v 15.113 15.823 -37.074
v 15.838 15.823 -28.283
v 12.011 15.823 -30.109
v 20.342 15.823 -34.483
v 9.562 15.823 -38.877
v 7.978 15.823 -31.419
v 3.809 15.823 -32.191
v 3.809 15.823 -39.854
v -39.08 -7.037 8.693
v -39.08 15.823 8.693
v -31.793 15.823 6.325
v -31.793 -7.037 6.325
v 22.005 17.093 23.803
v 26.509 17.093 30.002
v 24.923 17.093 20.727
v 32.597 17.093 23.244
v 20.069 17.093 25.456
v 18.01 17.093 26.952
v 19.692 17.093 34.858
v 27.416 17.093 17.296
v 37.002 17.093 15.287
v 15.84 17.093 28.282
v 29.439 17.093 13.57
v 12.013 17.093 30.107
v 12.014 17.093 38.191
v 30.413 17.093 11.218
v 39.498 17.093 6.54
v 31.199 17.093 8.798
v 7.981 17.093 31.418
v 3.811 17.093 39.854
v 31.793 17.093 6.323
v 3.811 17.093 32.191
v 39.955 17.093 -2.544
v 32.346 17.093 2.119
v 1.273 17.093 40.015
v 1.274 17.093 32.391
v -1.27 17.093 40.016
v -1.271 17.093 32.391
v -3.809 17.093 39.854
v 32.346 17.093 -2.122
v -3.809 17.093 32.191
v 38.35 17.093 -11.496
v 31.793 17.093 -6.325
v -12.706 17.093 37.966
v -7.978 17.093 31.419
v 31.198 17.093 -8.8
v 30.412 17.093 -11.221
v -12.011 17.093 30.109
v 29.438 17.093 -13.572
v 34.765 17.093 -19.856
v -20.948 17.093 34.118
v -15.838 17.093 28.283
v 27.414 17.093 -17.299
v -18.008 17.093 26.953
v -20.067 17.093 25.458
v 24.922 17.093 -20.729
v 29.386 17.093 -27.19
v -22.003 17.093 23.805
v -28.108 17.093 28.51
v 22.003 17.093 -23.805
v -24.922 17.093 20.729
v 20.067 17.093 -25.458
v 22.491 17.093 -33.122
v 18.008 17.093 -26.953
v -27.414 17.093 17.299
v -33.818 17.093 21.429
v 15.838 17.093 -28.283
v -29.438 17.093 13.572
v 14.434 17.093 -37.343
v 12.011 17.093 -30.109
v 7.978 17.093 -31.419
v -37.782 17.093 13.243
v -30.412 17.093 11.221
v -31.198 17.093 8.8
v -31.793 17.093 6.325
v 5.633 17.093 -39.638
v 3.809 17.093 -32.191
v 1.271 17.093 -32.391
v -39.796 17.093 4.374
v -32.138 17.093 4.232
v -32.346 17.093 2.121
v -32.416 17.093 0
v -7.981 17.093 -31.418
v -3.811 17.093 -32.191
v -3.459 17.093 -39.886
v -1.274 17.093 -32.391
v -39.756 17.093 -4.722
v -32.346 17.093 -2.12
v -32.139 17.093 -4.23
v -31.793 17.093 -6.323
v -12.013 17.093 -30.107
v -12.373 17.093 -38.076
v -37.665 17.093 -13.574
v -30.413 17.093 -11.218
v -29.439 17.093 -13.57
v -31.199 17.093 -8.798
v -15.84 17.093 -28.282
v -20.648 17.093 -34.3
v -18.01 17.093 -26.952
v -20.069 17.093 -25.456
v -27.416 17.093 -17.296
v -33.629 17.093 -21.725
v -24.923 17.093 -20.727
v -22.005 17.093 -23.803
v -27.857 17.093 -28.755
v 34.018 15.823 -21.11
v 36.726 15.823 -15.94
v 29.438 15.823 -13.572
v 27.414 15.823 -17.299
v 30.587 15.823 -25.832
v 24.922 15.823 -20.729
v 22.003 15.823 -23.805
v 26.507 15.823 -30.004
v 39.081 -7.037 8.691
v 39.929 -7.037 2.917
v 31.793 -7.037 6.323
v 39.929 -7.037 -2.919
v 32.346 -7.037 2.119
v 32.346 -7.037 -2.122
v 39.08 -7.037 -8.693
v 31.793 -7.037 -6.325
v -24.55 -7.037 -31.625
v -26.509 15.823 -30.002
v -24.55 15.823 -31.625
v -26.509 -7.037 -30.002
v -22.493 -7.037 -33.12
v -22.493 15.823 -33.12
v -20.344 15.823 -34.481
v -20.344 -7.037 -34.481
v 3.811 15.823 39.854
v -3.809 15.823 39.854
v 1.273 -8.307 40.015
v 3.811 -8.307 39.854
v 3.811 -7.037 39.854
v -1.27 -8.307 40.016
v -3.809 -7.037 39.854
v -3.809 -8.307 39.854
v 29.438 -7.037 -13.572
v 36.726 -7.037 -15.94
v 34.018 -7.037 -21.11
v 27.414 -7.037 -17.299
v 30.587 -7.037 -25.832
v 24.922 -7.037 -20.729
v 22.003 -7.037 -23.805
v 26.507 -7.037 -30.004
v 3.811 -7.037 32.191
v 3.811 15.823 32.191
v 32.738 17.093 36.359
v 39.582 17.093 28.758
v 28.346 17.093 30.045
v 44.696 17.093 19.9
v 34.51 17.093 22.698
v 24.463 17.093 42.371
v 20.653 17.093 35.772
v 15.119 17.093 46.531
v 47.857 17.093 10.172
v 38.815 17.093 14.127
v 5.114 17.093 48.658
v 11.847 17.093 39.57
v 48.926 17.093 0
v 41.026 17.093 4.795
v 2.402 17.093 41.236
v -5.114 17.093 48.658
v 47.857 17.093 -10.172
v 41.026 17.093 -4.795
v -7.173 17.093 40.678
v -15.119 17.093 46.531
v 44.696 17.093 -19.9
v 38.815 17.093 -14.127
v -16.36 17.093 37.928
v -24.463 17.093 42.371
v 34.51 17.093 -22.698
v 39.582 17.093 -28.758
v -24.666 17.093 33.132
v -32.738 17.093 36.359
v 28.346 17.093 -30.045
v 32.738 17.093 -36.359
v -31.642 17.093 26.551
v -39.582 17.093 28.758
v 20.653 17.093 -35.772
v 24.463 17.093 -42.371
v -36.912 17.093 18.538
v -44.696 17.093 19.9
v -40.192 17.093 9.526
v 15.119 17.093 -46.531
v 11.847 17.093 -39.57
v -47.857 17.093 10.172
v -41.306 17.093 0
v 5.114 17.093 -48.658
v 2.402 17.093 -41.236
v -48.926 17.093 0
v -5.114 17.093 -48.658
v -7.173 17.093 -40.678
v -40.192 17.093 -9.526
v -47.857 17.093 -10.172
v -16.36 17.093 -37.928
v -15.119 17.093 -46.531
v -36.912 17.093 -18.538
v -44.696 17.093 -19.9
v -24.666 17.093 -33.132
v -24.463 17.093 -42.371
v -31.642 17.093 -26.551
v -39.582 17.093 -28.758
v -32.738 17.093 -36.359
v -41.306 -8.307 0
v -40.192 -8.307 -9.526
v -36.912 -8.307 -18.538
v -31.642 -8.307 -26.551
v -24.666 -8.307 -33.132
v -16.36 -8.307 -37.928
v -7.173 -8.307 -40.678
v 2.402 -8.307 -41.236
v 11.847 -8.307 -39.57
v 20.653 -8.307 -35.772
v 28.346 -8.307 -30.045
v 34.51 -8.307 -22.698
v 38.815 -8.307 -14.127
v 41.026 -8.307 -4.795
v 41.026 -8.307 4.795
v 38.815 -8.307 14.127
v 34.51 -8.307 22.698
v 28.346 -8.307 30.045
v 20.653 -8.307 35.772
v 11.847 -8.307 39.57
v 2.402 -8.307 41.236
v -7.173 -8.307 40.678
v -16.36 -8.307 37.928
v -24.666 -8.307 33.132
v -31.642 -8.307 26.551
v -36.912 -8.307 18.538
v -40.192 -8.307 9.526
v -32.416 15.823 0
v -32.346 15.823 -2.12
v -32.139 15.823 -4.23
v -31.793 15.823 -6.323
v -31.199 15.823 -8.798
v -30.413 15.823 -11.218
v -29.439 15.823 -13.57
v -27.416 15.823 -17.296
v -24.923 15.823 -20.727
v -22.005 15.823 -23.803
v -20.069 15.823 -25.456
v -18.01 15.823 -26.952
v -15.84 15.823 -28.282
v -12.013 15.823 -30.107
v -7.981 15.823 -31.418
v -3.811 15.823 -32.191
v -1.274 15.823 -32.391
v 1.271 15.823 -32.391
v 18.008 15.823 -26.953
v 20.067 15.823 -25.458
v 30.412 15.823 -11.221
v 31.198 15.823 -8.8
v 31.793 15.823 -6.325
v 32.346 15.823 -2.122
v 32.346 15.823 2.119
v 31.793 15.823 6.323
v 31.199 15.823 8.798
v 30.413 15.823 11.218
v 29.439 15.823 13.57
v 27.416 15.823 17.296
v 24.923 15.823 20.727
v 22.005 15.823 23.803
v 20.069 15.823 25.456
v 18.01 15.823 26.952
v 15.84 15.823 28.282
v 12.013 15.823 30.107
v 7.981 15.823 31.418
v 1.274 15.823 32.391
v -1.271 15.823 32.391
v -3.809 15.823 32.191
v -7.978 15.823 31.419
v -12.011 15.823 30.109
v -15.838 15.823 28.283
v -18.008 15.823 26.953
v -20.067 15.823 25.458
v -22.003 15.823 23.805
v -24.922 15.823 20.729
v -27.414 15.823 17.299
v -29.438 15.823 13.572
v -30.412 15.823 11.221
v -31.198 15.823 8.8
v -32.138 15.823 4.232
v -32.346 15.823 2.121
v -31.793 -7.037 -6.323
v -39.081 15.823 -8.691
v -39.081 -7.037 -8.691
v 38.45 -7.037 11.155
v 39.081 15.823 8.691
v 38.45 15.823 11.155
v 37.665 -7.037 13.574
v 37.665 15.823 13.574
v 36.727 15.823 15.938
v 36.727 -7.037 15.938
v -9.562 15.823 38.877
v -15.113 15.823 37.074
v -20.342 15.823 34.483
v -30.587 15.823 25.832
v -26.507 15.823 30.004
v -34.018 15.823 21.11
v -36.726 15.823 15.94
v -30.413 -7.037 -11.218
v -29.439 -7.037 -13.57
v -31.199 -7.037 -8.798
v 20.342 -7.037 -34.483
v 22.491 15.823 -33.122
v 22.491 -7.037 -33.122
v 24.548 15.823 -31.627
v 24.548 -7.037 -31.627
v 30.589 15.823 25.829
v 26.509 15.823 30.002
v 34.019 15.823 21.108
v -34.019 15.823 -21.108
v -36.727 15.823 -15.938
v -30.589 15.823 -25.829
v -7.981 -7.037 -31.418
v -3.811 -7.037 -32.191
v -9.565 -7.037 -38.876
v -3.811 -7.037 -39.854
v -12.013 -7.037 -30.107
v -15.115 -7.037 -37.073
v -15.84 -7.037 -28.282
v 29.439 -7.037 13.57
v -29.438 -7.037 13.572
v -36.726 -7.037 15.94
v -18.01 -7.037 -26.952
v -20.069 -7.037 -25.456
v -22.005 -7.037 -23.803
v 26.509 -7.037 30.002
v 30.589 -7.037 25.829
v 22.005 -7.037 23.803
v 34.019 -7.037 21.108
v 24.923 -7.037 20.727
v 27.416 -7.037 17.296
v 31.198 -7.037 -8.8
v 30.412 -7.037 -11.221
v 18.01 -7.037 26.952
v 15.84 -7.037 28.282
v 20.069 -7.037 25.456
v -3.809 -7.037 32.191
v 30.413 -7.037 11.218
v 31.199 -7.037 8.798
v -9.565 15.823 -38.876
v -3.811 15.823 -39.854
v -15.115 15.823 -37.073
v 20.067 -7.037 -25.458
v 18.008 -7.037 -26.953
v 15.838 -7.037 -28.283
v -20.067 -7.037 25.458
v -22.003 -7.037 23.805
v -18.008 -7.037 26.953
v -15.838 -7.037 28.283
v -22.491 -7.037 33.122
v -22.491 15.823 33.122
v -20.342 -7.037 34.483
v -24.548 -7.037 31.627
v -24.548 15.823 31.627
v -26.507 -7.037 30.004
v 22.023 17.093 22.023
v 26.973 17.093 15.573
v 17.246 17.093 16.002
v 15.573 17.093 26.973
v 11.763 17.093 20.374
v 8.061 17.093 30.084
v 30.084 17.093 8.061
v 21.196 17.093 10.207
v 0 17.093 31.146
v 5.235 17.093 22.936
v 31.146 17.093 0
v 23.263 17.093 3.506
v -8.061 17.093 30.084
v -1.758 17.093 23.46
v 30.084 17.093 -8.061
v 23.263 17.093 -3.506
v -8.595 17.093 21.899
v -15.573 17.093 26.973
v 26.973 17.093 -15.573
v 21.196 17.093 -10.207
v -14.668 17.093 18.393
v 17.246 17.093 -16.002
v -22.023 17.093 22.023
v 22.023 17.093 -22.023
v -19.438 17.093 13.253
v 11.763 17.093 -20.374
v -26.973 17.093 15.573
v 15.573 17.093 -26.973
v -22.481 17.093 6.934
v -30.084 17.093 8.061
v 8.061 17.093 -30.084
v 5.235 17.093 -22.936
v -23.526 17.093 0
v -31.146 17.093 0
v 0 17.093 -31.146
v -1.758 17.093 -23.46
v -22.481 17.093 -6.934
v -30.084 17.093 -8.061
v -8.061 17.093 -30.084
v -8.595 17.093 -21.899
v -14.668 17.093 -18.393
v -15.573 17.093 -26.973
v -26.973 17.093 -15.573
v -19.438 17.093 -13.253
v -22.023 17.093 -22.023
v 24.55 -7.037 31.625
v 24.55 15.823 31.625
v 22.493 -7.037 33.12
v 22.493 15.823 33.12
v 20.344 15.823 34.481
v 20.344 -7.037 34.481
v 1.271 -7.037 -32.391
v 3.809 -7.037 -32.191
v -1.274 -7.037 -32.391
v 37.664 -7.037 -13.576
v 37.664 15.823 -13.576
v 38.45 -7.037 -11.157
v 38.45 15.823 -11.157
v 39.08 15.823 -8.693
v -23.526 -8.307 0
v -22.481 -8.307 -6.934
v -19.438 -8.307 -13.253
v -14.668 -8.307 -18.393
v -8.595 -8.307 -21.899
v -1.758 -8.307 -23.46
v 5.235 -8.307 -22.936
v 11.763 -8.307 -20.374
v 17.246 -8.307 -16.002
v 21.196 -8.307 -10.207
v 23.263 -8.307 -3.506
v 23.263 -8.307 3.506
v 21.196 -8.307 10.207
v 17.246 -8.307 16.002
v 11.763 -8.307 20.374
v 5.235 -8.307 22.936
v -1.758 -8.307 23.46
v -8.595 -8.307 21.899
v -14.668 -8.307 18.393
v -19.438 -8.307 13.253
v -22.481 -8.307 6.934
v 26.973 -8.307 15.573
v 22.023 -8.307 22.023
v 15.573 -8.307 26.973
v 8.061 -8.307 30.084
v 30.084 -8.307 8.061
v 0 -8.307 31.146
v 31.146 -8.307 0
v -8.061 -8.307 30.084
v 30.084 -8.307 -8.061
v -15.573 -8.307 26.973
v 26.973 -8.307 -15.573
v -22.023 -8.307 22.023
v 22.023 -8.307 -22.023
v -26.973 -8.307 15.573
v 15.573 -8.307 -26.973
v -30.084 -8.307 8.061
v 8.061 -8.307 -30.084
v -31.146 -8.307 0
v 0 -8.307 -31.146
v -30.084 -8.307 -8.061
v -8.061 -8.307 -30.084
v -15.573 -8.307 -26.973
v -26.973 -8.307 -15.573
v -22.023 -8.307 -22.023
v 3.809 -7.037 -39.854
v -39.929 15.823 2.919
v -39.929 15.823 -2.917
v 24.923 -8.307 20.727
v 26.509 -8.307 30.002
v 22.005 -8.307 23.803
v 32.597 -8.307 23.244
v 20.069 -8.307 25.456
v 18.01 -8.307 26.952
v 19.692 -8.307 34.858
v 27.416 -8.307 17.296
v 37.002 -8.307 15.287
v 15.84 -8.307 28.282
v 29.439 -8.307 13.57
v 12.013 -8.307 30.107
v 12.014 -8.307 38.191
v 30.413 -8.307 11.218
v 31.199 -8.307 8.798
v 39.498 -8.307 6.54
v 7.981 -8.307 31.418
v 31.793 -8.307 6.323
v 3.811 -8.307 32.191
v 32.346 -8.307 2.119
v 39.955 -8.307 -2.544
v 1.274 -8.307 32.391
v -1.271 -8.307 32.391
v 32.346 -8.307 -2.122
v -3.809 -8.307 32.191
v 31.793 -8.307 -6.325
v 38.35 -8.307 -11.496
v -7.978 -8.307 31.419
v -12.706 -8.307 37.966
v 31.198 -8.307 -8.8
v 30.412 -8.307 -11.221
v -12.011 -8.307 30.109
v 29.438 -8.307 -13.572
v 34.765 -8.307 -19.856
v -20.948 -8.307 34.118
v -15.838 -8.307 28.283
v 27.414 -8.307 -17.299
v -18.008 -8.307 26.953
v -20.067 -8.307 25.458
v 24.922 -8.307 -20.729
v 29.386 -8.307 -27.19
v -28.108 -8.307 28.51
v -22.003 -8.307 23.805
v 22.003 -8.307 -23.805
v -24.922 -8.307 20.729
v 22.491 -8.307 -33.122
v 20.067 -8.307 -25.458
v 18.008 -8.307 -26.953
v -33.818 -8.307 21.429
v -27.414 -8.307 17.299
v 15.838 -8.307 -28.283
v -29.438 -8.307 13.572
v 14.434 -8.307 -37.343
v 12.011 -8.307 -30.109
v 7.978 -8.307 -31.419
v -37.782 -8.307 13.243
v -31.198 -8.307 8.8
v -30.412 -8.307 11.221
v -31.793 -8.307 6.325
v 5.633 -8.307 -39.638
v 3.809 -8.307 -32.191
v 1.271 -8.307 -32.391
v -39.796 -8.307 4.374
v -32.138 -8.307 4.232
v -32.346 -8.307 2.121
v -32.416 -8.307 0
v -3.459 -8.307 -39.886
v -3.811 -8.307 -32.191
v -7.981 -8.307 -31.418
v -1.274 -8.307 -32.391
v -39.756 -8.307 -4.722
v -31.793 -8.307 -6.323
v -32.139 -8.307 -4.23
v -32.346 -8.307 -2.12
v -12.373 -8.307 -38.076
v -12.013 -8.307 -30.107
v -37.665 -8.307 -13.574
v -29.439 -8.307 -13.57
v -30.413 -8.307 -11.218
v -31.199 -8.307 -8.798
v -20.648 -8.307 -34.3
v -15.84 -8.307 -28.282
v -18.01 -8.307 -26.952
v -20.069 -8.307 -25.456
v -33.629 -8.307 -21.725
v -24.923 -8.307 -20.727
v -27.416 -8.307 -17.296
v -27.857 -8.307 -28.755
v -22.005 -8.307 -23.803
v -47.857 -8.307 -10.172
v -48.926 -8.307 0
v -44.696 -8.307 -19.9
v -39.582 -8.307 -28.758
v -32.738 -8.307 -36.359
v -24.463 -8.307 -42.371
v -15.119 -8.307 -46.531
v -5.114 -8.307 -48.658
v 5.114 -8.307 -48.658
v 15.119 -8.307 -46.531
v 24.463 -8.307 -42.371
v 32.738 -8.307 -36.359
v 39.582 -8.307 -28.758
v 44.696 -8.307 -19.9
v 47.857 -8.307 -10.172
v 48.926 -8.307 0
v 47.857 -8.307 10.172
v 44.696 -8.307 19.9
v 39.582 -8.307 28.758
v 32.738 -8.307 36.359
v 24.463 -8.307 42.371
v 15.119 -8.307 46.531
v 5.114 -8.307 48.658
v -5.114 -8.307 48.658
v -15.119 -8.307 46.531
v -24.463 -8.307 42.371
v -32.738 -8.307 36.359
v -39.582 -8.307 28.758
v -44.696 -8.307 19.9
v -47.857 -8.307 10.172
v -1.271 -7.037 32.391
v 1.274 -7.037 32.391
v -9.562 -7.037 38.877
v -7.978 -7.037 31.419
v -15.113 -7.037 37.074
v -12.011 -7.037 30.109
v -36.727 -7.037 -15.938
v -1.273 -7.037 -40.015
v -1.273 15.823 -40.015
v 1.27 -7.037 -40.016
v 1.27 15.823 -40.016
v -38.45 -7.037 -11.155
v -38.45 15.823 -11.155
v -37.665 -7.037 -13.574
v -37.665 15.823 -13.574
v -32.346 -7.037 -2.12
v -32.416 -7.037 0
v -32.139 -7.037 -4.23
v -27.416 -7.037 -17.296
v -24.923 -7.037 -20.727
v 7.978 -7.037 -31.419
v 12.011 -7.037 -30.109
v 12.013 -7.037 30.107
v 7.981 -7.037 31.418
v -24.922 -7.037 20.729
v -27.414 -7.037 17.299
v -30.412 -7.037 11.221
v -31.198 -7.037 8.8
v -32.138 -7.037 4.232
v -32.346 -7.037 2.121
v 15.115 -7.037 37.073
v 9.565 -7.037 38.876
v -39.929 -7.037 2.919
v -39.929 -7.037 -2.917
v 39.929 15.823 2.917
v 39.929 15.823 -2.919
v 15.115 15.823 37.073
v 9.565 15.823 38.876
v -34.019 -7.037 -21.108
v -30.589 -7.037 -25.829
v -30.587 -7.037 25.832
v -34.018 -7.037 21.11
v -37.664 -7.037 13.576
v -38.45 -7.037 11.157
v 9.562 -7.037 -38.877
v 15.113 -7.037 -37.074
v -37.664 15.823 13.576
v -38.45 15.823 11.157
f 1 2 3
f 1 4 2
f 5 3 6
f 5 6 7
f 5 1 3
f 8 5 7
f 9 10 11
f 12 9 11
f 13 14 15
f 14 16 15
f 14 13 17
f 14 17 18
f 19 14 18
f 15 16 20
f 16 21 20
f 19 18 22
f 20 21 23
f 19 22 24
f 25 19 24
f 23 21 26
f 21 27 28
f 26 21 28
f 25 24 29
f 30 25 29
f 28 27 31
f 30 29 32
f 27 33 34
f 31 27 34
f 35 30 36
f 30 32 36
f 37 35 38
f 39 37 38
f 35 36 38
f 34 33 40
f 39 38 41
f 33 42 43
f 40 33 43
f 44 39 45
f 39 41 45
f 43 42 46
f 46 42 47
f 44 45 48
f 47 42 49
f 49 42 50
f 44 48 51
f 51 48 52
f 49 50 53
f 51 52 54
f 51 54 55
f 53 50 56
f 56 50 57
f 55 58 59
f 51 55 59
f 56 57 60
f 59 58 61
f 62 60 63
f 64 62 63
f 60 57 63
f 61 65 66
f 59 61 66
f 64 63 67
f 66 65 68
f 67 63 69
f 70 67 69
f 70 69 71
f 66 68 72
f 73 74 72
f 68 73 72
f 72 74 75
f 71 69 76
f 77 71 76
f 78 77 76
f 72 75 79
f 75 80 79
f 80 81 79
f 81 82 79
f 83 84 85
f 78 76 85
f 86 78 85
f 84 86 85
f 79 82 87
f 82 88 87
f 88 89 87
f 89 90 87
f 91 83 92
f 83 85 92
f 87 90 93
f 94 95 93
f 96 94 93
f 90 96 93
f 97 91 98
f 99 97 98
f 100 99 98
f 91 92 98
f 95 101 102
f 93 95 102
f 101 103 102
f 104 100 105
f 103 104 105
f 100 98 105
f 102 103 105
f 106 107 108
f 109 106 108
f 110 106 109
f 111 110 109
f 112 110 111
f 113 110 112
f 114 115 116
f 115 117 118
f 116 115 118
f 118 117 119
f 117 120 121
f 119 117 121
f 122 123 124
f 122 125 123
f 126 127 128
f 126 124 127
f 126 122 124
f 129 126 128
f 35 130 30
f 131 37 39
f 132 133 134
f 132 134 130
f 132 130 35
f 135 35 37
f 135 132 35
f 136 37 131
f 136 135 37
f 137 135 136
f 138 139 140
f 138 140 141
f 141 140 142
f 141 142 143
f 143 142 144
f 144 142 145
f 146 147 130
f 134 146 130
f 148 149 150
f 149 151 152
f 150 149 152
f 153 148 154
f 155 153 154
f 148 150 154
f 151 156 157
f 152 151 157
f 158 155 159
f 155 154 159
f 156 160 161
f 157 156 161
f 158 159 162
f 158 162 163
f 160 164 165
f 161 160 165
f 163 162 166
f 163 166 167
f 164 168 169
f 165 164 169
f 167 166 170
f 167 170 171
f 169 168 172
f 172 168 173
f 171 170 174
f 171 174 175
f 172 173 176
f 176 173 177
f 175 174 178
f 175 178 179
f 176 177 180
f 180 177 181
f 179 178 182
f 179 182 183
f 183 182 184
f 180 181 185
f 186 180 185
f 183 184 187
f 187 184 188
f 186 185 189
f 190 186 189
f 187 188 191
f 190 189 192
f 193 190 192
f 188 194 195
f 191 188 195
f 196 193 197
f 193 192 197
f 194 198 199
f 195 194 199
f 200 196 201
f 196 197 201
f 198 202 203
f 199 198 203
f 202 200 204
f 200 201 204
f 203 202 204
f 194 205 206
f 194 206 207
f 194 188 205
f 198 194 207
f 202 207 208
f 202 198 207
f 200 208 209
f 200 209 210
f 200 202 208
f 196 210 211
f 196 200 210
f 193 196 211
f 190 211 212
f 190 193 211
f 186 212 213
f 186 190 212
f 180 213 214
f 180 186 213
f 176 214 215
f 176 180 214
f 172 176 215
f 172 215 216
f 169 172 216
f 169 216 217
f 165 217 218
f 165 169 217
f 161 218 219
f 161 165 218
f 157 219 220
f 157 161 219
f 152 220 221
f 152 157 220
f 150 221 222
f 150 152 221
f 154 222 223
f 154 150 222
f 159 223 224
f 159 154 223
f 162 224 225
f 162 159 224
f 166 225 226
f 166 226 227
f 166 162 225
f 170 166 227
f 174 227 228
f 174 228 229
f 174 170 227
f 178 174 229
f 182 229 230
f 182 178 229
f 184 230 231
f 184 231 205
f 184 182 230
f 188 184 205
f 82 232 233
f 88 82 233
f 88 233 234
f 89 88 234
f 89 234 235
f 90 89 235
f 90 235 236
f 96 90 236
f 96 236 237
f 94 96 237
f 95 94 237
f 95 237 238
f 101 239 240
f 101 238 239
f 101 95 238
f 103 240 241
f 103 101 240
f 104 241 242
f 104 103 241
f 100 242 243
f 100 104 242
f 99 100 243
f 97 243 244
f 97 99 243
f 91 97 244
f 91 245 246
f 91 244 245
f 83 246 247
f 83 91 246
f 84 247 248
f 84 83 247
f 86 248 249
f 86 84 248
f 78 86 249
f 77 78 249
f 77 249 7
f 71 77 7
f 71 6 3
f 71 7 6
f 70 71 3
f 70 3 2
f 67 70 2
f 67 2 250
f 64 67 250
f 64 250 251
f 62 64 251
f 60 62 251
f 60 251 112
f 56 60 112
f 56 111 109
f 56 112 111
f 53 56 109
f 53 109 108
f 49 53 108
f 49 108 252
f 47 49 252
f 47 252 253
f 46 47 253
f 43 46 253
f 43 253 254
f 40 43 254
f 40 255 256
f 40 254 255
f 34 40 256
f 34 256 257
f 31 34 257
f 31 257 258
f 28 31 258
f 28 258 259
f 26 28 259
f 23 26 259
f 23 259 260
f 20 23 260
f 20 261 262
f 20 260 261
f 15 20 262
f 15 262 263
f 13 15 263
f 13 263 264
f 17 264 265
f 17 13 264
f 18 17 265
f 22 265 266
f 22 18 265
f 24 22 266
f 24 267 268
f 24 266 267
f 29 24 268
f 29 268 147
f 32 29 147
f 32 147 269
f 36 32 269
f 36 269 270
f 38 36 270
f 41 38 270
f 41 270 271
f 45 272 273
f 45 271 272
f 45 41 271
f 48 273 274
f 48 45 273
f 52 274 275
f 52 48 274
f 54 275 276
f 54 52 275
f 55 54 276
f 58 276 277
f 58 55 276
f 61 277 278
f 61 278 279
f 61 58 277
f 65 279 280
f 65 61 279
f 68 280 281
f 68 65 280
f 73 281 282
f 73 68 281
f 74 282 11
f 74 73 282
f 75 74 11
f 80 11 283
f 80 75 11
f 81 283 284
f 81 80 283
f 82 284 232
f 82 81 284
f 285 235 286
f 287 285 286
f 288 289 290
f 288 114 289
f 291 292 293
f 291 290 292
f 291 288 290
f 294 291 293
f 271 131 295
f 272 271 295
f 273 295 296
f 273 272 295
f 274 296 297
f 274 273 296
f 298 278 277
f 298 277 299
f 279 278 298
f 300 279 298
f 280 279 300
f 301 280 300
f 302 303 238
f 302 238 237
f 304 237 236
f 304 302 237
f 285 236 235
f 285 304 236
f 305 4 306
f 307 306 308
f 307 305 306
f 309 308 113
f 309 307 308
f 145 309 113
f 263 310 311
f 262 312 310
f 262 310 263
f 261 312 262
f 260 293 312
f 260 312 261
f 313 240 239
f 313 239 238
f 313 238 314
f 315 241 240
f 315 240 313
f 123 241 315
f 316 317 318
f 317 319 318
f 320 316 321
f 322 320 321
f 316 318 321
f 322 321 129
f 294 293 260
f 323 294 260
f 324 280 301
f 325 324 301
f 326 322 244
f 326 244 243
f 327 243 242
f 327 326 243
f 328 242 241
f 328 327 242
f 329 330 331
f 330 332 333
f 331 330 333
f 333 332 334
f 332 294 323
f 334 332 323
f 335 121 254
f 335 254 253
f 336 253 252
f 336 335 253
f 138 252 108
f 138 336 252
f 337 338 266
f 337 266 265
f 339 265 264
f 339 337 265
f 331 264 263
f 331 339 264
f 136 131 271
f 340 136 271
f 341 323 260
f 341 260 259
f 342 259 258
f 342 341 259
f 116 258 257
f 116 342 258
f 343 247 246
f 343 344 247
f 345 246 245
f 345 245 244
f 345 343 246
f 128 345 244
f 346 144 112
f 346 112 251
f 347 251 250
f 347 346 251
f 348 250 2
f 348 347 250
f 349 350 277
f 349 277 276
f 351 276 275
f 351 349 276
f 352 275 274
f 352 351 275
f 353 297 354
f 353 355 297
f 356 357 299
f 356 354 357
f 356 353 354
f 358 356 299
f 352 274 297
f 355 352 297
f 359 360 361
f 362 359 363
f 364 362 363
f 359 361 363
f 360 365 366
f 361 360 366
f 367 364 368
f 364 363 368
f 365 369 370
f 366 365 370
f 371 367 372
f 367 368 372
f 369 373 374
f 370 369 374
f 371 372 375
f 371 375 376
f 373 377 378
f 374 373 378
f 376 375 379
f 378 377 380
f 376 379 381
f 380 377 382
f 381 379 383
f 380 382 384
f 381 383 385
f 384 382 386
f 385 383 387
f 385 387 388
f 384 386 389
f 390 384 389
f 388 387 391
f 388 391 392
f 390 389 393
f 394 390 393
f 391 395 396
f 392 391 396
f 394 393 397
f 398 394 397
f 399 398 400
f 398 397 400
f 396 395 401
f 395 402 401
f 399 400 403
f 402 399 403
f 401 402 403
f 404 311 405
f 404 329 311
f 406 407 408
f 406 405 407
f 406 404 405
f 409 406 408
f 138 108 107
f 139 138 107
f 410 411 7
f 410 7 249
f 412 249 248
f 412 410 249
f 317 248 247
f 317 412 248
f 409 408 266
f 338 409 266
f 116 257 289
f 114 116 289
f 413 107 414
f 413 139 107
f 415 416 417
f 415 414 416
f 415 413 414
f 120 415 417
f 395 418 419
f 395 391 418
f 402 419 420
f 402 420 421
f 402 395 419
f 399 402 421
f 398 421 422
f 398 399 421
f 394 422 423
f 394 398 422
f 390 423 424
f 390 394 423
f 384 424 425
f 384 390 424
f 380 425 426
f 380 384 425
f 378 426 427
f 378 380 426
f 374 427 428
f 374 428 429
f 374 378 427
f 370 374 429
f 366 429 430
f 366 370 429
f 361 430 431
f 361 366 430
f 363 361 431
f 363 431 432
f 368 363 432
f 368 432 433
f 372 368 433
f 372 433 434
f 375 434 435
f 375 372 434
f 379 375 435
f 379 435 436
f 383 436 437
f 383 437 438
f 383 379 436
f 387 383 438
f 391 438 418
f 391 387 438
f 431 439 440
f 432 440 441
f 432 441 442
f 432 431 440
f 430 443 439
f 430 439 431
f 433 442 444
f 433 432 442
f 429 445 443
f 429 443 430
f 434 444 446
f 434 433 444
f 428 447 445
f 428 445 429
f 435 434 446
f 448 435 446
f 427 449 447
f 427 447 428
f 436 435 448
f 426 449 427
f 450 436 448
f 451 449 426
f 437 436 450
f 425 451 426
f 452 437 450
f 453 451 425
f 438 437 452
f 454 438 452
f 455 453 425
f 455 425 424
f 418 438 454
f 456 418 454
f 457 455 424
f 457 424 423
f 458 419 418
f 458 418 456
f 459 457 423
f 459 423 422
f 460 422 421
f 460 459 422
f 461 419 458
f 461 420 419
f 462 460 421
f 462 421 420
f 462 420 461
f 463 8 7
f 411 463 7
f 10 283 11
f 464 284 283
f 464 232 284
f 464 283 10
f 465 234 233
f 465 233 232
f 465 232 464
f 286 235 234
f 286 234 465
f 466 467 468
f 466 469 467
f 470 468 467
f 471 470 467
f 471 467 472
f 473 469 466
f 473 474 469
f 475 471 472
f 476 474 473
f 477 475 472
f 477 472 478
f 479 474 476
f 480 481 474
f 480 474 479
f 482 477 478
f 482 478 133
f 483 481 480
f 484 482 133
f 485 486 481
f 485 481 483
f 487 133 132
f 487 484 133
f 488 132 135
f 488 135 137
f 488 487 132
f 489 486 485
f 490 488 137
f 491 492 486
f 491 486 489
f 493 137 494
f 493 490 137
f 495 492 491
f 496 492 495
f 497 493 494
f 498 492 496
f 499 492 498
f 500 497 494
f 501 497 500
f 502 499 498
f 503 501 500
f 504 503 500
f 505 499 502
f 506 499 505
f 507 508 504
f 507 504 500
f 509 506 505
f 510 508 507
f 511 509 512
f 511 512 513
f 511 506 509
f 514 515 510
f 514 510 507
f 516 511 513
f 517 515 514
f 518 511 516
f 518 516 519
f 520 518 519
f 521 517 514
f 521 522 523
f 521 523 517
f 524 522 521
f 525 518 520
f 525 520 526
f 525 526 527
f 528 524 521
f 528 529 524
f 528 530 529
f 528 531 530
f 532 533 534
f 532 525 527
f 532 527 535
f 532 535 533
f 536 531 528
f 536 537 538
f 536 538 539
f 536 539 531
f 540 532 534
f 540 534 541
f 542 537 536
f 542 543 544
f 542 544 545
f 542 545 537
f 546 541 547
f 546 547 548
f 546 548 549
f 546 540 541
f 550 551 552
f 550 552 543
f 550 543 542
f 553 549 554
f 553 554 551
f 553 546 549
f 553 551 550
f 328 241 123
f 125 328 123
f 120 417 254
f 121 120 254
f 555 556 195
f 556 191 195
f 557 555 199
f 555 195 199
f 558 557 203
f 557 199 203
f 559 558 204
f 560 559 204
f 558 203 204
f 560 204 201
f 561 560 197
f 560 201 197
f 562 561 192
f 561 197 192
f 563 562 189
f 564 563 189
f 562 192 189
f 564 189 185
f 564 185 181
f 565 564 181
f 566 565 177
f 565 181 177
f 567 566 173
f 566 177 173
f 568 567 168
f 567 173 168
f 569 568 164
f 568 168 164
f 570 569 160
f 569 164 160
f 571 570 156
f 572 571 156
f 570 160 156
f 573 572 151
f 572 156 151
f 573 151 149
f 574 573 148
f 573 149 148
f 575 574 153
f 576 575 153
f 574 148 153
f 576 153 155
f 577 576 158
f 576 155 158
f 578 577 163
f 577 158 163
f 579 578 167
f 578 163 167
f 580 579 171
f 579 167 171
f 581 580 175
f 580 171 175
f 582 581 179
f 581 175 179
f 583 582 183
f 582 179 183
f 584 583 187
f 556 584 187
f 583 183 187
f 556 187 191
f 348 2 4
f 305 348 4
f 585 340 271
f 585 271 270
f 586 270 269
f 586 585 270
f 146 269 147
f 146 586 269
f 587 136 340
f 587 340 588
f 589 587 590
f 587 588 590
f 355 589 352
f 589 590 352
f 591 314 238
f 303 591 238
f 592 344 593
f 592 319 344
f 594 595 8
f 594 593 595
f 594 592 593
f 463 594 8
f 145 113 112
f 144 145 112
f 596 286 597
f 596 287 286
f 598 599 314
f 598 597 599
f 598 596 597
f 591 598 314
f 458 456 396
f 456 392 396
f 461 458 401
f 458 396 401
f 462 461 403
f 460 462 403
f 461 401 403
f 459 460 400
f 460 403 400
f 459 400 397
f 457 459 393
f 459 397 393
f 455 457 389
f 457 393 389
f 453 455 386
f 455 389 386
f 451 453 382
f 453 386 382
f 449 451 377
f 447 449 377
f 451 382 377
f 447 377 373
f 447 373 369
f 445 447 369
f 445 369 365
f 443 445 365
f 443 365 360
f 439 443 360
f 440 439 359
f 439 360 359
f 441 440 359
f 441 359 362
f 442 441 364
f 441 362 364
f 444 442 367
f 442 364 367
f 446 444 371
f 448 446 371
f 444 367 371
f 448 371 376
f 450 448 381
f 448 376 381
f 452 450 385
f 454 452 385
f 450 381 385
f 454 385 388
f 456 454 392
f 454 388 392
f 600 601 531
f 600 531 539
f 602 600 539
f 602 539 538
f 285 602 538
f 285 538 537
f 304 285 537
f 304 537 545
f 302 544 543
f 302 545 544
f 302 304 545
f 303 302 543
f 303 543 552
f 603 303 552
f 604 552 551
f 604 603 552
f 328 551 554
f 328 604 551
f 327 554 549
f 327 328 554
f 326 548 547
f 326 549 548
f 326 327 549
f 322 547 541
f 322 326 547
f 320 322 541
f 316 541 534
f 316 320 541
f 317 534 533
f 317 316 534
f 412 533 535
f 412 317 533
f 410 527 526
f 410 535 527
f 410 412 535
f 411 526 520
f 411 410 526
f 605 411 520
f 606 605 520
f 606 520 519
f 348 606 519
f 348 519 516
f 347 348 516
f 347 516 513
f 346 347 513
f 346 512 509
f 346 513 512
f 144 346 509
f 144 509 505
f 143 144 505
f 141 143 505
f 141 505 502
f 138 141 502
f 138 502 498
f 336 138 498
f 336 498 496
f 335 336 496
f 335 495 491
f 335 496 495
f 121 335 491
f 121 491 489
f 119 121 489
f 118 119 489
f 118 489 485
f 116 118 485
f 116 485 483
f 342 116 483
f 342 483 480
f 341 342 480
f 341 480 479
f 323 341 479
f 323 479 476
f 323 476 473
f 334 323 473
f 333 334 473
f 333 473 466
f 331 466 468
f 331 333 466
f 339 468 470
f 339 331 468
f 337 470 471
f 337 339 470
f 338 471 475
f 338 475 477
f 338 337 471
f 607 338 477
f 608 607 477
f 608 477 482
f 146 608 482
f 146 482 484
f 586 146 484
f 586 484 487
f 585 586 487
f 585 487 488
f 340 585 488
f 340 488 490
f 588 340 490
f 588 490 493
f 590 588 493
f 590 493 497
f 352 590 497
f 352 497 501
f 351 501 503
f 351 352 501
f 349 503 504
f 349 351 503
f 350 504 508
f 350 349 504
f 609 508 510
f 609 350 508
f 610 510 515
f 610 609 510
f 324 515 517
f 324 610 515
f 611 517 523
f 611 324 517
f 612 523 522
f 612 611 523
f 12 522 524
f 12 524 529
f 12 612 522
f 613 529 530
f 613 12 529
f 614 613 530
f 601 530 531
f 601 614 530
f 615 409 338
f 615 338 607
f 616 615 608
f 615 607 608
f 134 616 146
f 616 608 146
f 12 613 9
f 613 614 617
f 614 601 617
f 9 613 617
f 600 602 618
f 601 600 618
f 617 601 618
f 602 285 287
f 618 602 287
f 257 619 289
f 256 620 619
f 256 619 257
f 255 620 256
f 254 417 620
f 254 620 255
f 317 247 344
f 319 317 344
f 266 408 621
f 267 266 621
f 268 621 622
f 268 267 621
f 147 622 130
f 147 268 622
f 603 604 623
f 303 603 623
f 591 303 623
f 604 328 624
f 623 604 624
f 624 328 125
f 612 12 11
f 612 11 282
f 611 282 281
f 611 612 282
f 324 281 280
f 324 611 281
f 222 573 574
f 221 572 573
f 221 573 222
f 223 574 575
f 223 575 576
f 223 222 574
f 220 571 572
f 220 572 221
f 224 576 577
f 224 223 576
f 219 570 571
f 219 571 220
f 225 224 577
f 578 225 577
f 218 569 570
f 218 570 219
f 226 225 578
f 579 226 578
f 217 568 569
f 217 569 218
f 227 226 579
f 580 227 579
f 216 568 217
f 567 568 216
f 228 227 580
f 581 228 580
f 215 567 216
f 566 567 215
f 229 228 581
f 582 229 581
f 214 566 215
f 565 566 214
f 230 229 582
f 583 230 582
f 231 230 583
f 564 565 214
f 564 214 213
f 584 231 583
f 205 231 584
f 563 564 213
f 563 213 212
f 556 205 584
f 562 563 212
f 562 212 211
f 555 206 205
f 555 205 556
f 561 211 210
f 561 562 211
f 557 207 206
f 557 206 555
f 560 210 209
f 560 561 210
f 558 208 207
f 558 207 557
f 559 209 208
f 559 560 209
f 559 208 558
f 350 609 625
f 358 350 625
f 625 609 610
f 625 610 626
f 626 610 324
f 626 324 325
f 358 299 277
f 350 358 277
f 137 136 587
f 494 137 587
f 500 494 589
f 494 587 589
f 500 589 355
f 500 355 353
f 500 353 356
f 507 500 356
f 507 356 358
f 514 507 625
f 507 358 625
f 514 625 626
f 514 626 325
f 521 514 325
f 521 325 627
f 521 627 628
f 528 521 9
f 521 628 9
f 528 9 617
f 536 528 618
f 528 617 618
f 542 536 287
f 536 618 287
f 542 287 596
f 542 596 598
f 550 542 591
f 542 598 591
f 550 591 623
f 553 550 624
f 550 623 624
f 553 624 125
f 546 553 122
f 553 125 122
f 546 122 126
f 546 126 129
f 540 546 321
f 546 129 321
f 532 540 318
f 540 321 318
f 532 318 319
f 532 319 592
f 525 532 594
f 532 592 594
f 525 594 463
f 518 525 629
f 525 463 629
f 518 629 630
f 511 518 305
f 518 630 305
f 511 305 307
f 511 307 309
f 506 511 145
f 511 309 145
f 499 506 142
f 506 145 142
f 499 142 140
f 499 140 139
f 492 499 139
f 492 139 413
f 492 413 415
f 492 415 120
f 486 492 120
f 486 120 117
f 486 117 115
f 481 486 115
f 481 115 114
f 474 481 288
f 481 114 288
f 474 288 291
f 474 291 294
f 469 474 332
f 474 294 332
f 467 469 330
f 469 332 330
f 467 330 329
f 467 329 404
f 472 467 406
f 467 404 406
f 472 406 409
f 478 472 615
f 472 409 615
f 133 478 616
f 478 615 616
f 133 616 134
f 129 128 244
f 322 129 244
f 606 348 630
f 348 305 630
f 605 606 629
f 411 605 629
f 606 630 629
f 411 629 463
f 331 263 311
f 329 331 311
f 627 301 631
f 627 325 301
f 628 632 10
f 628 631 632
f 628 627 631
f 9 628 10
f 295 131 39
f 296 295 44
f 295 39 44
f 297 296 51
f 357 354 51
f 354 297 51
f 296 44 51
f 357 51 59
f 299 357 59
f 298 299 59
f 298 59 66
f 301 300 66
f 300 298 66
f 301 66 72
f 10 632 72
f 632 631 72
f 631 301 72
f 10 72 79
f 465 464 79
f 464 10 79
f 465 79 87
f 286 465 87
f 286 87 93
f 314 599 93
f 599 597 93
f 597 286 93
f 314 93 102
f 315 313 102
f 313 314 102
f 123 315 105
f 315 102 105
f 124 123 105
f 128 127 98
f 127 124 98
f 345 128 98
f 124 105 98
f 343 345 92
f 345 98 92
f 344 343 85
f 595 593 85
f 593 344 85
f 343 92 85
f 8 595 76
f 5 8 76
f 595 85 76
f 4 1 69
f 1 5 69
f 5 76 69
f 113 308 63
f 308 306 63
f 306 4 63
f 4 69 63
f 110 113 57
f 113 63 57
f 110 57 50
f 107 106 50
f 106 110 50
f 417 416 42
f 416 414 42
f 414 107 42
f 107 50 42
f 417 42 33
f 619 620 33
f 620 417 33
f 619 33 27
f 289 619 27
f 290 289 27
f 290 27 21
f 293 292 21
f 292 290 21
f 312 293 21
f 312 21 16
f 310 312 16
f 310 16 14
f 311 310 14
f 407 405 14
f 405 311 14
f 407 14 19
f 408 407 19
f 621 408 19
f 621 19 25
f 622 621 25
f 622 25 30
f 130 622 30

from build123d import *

# Parameters (mm, degrees)
F0_W     = 7.62
F0_H     = 1.27
F3_DEPTH = 25.4
F4_COUNT = 10
F0_H_2   = 25.4


with BuildPart() as f1:
    # F0 (on Top) → F1 (revolve)
    with BuildSketch(Plane.XY):
        with Locations((-36.225725, 16.45785)):
            Rectangle(F0_W, F0_H)
        with Locations((-36.225725, -7.67215)):
            Rectangle(F0_W, F0_H)
    revolve(axis=Axis((0, 8.546425, 0), (0, -1, 0)))

    # F2 (on face) → F3 (join)
    with BuildSketch(Plane.XZ.offset(8.30715)):
        with BuildLine():
            ThreePointArc((3.811419, 39.853888), (0.001425, 40.035725), (-3.808581, 39.854159))
            Line((-3.808581, 39.854159), (-3.808581, 32.191209))
            ThreePointArc((-3.808581, 32.191209), (0.001429, 32.415725), (3.811419, 32.190873))
            Line((3.811419, 32.190873), (3.811419, 39.853888))
        make_face()
    extrude(amount=-F3_DEPTH)

    # F4: F1 ×10 about axis
    f4_axis = Axis((0, 8.546425, 0), (0, -1, 0))


with BuildPart() as f1_1:
    add(f1.part)
    for i in range(1, F4_COUNT):
        add(f1.part.rotate(f4_axis, i * 360 / F4_COUNT))


with BuildPart() as f5:
    # F0 (on Top) → F5 (revolve)
    with BuildSketch(Plane.XY):
        with Locations((-45.115725, 4.39285)):
            Rectangle(F0_W, F0_H_2)
        with Locations((-27.335725, 4.39285)):
            Rectangle(F0_W, F0_H_2)
    revolve(axis=Axis((0, 8.546425, 0), (0, -1, 0)))


solid = Compound([f1_1.part, f5.part])
